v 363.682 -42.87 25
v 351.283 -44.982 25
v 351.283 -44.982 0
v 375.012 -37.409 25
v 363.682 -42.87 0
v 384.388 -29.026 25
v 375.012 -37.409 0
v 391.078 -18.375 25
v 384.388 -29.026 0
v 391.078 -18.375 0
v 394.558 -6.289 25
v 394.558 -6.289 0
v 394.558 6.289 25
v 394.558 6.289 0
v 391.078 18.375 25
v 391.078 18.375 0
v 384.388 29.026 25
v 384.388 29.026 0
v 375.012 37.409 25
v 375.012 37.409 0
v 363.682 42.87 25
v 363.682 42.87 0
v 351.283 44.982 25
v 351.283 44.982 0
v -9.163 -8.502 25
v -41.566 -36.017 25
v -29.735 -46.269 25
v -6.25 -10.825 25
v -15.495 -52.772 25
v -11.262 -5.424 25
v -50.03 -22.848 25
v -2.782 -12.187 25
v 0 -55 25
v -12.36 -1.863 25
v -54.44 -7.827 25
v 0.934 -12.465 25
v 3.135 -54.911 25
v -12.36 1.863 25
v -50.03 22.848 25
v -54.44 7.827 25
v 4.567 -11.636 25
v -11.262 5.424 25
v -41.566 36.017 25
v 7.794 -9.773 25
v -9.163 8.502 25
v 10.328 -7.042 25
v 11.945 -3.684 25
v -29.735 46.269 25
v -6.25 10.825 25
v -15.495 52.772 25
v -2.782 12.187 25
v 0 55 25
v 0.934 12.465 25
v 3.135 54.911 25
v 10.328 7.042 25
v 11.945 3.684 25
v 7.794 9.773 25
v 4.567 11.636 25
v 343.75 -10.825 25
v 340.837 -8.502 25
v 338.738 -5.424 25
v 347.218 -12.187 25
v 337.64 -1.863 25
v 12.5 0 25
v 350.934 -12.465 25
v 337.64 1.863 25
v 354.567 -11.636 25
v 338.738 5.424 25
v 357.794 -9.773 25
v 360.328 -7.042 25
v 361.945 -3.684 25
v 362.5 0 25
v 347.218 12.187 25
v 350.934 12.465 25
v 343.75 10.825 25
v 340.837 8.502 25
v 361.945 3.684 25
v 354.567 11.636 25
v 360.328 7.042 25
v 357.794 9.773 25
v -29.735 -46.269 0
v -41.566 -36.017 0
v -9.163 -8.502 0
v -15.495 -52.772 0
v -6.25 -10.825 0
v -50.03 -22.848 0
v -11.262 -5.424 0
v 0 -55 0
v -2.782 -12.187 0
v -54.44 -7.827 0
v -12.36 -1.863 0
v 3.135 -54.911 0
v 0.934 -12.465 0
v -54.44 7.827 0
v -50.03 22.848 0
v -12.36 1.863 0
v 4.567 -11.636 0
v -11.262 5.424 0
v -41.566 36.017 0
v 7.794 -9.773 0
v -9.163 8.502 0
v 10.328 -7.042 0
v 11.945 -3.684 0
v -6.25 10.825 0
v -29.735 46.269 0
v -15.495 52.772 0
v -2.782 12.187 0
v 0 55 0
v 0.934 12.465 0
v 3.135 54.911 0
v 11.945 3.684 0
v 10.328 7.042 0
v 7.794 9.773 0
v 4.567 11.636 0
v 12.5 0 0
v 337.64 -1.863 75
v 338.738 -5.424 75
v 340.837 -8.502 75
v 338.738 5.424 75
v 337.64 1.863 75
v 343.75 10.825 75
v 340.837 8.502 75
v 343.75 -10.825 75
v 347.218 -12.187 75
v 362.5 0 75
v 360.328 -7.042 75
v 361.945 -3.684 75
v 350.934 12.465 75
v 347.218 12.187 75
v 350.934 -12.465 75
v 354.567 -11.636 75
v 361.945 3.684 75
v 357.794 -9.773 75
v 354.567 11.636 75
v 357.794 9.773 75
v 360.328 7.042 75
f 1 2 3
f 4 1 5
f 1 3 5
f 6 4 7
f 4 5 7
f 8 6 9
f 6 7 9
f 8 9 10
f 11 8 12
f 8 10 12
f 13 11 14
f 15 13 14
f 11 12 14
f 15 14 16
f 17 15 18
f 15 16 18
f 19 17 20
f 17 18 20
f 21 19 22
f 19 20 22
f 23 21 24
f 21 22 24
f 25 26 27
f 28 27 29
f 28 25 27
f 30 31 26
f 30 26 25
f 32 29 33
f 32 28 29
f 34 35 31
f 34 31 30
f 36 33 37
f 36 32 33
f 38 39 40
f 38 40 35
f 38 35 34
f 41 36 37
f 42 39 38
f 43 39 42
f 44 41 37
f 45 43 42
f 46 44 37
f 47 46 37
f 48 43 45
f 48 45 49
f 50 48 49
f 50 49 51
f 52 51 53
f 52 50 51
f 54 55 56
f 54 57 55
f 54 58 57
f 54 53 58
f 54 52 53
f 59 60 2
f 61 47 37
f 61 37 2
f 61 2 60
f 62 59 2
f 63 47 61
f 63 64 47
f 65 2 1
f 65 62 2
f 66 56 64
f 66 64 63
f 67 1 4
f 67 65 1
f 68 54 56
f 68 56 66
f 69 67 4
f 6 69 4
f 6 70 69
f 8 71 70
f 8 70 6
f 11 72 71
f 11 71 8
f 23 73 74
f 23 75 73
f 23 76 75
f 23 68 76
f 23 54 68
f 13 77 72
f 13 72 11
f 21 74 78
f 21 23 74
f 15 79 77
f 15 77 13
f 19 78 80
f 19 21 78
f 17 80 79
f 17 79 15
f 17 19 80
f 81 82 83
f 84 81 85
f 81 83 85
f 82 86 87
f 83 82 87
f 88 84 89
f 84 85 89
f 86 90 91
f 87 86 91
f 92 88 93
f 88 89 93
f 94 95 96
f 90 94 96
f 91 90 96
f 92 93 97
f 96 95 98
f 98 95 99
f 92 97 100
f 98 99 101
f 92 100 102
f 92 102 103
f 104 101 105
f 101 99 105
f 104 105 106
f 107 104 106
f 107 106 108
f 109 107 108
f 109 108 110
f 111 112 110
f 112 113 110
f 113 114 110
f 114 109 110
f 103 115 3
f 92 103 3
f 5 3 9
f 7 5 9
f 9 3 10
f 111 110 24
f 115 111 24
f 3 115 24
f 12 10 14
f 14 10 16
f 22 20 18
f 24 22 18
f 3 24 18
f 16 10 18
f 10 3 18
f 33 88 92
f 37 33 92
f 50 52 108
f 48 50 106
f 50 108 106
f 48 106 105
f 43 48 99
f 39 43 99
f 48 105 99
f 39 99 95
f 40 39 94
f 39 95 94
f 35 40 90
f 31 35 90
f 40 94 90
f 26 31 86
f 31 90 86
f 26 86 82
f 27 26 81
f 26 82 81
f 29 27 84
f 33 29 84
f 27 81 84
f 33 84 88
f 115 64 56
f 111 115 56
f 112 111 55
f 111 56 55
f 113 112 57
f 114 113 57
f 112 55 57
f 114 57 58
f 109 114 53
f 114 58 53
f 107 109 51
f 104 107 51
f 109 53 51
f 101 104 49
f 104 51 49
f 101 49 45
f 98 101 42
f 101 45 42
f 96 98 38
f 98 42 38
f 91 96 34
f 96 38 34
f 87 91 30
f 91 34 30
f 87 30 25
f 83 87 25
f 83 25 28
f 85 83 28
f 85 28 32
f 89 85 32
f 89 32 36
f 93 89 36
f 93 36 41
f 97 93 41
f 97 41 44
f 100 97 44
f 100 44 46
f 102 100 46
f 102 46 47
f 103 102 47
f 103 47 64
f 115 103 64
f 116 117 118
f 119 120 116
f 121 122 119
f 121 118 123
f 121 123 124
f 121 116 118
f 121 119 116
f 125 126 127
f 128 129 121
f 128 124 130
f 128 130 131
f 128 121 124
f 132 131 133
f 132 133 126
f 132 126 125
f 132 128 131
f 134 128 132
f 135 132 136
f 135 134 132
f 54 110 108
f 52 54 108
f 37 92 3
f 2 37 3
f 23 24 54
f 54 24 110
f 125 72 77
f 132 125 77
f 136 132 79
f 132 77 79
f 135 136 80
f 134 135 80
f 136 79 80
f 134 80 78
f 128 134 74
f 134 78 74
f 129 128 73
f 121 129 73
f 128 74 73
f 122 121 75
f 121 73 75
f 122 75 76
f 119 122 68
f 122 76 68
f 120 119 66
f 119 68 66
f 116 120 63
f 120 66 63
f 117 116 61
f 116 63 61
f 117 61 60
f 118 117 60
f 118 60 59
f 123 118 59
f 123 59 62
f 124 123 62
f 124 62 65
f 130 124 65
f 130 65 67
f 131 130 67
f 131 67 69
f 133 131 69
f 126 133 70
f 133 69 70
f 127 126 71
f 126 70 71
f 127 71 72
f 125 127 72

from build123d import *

# Parameters (mm, degrees)
F1_DEPTH = 25
F2_R     = 12.5
F3_DEPTH = 25.001
F4_R     = 12.5
F5_DEPTH = 50


with BuildPart() as f1:
    # F0 (on Top) → F1 (new body)
    with BuildSketch(Plane.XY):
        with BuildLine():
            Line((351.28284, 44.981711), (3.134557, 54.910605))
            Line((3.134557, 54.910605), (0, 55))
            ThreePointArc((0, 55), (-55, 0), (0, -55))
            Line((0, -55), (3.134557, -54.910605))
            Line((3.134557, -54.910605), (351.28284, -44.981711))
            ThreePointArc((351.28284, -44.981711), (395, 0), (351.28284, 44.981711))
        make_face()
    extrude(amount=F1_DEPTH)

    # F2 (on face) → F3 (cut, through all)
    with BuildSketch(Plane.XY.offset(25)):
        Circle(F2_R)
    extrude(amount=-F3_DEPTH, mode=Mode.SUBTRACT)

    # F4 (on face) → F5 (join)
    with BuildSketch(Plane.XY.offset(25)):
        with Locations((350, 0)):
            Circle(F4_R)
    extrude(amount=F5_DEPTH)


solid = f1.part
